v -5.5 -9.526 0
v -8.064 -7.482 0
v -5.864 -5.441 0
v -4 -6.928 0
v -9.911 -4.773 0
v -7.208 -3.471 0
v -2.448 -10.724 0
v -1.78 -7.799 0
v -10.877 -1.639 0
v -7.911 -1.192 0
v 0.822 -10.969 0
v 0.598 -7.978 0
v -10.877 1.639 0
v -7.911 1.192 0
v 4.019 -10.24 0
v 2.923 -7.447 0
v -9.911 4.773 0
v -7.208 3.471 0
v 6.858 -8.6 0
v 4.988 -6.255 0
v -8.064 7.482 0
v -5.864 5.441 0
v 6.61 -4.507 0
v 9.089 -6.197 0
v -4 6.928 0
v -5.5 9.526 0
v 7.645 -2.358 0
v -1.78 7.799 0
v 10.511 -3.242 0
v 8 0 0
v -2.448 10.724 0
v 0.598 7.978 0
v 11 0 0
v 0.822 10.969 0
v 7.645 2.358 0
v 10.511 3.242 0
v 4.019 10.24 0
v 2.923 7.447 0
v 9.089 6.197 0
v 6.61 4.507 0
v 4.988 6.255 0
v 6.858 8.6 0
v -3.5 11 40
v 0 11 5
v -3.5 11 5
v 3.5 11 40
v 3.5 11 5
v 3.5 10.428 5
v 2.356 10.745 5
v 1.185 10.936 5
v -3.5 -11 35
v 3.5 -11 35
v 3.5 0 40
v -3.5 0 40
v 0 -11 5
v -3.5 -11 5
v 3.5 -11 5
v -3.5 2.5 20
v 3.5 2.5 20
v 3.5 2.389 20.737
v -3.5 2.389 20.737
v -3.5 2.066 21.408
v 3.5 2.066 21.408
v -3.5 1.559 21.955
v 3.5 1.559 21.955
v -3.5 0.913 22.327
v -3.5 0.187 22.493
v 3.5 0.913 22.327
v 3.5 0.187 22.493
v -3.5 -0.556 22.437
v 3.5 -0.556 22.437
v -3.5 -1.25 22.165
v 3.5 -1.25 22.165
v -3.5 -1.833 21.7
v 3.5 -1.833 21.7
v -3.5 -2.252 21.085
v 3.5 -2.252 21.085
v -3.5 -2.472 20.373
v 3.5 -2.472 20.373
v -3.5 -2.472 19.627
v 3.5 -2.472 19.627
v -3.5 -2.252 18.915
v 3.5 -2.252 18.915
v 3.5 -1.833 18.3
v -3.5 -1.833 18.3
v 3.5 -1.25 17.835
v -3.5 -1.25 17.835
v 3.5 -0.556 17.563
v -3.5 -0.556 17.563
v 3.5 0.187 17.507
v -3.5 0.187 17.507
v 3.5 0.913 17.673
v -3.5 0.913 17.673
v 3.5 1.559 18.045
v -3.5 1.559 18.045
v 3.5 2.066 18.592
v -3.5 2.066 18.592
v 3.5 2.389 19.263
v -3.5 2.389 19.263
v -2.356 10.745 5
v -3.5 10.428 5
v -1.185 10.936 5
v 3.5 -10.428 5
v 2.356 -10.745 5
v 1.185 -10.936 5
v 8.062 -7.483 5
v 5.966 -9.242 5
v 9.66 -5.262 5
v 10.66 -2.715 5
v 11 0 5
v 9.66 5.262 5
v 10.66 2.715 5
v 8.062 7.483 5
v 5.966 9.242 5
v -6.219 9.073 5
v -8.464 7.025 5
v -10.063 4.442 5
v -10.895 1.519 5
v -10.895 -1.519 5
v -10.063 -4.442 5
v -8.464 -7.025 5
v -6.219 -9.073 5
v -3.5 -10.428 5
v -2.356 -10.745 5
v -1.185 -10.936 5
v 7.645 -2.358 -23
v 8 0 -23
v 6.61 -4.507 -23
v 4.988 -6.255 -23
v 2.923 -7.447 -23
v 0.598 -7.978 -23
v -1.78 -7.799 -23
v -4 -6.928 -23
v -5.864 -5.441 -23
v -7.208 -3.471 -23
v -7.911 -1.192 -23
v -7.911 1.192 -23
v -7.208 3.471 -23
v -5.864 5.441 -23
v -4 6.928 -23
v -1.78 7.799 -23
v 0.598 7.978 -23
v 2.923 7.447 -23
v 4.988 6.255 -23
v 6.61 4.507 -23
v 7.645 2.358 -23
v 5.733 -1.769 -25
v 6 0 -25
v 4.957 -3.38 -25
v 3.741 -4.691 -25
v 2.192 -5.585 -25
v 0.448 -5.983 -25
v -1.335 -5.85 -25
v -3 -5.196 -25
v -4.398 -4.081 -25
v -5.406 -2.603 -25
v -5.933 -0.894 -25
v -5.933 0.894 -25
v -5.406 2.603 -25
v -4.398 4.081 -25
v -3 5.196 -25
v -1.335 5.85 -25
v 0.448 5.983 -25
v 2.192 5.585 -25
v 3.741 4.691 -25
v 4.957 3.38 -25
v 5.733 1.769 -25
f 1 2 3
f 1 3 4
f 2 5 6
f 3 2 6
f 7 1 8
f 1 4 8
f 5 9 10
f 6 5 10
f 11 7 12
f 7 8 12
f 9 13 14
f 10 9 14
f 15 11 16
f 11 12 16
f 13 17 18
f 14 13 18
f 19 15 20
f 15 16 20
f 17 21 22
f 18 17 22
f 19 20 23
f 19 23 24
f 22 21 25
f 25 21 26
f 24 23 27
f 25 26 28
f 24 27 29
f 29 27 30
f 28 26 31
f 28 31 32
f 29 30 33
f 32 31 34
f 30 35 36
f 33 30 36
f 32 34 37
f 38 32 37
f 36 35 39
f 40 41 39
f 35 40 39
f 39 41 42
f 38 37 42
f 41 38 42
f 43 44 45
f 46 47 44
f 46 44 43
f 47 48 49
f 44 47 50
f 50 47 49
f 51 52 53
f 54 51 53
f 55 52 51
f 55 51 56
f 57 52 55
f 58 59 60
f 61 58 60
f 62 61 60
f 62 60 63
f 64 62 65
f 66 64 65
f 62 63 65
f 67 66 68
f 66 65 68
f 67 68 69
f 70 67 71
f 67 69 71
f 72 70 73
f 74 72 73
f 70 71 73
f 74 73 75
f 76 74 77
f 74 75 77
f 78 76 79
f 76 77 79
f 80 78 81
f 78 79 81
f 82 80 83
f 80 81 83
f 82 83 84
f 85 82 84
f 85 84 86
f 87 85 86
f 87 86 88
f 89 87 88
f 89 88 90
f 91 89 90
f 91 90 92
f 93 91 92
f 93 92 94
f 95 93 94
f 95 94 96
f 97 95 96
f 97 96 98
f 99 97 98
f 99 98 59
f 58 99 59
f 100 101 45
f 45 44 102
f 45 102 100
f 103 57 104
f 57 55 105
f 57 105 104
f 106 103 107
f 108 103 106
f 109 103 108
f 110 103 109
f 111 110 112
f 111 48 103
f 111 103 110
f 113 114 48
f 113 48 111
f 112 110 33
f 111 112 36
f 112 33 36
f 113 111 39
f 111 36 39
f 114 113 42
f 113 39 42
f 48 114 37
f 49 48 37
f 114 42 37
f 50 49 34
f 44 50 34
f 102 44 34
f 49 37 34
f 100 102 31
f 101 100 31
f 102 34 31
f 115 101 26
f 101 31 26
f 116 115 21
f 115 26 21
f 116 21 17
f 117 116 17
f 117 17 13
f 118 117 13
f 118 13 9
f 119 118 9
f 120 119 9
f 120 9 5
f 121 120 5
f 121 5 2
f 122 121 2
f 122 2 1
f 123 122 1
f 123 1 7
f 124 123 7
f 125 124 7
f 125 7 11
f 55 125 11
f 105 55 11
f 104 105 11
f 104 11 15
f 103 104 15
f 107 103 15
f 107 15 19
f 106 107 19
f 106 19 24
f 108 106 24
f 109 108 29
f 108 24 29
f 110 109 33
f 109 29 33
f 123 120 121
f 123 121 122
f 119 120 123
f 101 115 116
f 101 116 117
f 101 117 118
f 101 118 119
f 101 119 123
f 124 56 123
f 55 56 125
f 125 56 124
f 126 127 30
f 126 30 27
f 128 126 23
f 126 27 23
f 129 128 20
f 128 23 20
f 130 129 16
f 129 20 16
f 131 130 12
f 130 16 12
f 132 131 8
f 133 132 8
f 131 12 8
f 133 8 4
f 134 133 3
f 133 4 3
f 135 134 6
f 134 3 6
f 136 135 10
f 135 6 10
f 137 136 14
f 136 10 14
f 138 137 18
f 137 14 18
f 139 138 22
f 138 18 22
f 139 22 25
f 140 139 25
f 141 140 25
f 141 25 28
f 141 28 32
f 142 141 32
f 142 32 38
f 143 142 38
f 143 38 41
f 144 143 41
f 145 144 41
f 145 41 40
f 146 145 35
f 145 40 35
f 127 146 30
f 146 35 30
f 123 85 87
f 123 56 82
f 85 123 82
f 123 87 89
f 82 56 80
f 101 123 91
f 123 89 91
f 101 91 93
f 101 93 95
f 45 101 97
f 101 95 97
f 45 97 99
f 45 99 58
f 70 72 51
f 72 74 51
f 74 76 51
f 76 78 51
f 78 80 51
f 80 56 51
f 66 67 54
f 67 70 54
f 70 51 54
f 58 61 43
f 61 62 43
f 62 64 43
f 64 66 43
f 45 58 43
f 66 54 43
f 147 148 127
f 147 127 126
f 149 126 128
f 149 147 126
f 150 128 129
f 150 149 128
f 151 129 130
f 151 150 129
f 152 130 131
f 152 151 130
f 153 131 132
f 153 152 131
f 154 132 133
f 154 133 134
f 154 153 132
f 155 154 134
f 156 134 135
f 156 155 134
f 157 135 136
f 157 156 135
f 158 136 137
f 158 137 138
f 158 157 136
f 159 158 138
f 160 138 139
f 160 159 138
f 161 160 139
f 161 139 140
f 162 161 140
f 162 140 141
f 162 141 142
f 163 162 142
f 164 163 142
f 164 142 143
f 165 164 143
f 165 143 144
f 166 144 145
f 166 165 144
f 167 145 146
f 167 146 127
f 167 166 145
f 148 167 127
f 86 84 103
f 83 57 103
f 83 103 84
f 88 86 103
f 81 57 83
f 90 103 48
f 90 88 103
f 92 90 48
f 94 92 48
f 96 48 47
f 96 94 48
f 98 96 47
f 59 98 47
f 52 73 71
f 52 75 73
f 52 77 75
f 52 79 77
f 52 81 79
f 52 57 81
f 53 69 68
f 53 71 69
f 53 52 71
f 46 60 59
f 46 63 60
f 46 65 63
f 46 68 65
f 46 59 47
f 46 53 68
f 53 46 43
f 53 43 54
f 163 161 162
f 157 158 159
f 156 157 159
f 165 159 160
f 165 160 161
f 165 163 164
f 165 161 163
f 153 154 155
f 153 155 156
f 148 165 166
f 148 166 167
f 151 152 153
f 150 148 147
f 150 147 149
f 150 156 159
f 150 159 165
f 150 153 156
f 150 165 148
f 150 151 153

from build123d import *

# Parameters (mm, degrees)
F0_R     = 11
F1_DEPTH = 5
F3_DEPTH = 3.5
F5_DEPTH = 14.501
F6_R     = 2.5
F7_DEPTH = 14.501
F8_R     = 8
F9_DEPTH = 25
F10_SIZE = 2


with BuildPart() as f1:
    # F0 (on Top) → F1 (new body)
    with BuildSketch(Plane.XY):
        Circle(F0_R)
    extrude(amount=F1_DEPTH)

    # F2 (on Right) → F3 (join, symmetric)
    with BuildSketch(Plane.YZ):
        Polygon((-11, 5), (0, 5), (11, 5), (11, 40), (-11, 40), align=None)
    extrude(amount=F3_DEPTH, both=True)

    # F4 (on face) → F5 (cut, through all)
    with BuildSketch(Plane.YZ.offset(3.5)):
        Polygon((-11, 35), (0, 40), (-11, 40), align=None)
    extrude(amount=-F5_DEPTH, mode=Mode.SUBTRACT)

    # F6 (on face) → F7 (cut, through all)
    with BuildSketch(Plane.YZ.offset(3.5)):
        with Locations((0, 20)):
            Circle(F6_R)
    extrude(amount=-F7_DEPTH, mode=Mode.SUBTRACT)

    # F8 (on face) → F9 (join)
    with BuildSketch(Plane(origin=(0, 0, 0), x_dir=(1, 0, 0), z_dir=(0, 0, -1))):
        Circle(F8_R)
    extrude(amount=F9_DEPTH)

    # F10
    f10_edges = [f1.edges().sort_by_distance(p)[0] for p in [
        (-8, 0, -25),
    ]]
    chamfer(f10_edges, length=F10_SIZE)


solid = f1.part
